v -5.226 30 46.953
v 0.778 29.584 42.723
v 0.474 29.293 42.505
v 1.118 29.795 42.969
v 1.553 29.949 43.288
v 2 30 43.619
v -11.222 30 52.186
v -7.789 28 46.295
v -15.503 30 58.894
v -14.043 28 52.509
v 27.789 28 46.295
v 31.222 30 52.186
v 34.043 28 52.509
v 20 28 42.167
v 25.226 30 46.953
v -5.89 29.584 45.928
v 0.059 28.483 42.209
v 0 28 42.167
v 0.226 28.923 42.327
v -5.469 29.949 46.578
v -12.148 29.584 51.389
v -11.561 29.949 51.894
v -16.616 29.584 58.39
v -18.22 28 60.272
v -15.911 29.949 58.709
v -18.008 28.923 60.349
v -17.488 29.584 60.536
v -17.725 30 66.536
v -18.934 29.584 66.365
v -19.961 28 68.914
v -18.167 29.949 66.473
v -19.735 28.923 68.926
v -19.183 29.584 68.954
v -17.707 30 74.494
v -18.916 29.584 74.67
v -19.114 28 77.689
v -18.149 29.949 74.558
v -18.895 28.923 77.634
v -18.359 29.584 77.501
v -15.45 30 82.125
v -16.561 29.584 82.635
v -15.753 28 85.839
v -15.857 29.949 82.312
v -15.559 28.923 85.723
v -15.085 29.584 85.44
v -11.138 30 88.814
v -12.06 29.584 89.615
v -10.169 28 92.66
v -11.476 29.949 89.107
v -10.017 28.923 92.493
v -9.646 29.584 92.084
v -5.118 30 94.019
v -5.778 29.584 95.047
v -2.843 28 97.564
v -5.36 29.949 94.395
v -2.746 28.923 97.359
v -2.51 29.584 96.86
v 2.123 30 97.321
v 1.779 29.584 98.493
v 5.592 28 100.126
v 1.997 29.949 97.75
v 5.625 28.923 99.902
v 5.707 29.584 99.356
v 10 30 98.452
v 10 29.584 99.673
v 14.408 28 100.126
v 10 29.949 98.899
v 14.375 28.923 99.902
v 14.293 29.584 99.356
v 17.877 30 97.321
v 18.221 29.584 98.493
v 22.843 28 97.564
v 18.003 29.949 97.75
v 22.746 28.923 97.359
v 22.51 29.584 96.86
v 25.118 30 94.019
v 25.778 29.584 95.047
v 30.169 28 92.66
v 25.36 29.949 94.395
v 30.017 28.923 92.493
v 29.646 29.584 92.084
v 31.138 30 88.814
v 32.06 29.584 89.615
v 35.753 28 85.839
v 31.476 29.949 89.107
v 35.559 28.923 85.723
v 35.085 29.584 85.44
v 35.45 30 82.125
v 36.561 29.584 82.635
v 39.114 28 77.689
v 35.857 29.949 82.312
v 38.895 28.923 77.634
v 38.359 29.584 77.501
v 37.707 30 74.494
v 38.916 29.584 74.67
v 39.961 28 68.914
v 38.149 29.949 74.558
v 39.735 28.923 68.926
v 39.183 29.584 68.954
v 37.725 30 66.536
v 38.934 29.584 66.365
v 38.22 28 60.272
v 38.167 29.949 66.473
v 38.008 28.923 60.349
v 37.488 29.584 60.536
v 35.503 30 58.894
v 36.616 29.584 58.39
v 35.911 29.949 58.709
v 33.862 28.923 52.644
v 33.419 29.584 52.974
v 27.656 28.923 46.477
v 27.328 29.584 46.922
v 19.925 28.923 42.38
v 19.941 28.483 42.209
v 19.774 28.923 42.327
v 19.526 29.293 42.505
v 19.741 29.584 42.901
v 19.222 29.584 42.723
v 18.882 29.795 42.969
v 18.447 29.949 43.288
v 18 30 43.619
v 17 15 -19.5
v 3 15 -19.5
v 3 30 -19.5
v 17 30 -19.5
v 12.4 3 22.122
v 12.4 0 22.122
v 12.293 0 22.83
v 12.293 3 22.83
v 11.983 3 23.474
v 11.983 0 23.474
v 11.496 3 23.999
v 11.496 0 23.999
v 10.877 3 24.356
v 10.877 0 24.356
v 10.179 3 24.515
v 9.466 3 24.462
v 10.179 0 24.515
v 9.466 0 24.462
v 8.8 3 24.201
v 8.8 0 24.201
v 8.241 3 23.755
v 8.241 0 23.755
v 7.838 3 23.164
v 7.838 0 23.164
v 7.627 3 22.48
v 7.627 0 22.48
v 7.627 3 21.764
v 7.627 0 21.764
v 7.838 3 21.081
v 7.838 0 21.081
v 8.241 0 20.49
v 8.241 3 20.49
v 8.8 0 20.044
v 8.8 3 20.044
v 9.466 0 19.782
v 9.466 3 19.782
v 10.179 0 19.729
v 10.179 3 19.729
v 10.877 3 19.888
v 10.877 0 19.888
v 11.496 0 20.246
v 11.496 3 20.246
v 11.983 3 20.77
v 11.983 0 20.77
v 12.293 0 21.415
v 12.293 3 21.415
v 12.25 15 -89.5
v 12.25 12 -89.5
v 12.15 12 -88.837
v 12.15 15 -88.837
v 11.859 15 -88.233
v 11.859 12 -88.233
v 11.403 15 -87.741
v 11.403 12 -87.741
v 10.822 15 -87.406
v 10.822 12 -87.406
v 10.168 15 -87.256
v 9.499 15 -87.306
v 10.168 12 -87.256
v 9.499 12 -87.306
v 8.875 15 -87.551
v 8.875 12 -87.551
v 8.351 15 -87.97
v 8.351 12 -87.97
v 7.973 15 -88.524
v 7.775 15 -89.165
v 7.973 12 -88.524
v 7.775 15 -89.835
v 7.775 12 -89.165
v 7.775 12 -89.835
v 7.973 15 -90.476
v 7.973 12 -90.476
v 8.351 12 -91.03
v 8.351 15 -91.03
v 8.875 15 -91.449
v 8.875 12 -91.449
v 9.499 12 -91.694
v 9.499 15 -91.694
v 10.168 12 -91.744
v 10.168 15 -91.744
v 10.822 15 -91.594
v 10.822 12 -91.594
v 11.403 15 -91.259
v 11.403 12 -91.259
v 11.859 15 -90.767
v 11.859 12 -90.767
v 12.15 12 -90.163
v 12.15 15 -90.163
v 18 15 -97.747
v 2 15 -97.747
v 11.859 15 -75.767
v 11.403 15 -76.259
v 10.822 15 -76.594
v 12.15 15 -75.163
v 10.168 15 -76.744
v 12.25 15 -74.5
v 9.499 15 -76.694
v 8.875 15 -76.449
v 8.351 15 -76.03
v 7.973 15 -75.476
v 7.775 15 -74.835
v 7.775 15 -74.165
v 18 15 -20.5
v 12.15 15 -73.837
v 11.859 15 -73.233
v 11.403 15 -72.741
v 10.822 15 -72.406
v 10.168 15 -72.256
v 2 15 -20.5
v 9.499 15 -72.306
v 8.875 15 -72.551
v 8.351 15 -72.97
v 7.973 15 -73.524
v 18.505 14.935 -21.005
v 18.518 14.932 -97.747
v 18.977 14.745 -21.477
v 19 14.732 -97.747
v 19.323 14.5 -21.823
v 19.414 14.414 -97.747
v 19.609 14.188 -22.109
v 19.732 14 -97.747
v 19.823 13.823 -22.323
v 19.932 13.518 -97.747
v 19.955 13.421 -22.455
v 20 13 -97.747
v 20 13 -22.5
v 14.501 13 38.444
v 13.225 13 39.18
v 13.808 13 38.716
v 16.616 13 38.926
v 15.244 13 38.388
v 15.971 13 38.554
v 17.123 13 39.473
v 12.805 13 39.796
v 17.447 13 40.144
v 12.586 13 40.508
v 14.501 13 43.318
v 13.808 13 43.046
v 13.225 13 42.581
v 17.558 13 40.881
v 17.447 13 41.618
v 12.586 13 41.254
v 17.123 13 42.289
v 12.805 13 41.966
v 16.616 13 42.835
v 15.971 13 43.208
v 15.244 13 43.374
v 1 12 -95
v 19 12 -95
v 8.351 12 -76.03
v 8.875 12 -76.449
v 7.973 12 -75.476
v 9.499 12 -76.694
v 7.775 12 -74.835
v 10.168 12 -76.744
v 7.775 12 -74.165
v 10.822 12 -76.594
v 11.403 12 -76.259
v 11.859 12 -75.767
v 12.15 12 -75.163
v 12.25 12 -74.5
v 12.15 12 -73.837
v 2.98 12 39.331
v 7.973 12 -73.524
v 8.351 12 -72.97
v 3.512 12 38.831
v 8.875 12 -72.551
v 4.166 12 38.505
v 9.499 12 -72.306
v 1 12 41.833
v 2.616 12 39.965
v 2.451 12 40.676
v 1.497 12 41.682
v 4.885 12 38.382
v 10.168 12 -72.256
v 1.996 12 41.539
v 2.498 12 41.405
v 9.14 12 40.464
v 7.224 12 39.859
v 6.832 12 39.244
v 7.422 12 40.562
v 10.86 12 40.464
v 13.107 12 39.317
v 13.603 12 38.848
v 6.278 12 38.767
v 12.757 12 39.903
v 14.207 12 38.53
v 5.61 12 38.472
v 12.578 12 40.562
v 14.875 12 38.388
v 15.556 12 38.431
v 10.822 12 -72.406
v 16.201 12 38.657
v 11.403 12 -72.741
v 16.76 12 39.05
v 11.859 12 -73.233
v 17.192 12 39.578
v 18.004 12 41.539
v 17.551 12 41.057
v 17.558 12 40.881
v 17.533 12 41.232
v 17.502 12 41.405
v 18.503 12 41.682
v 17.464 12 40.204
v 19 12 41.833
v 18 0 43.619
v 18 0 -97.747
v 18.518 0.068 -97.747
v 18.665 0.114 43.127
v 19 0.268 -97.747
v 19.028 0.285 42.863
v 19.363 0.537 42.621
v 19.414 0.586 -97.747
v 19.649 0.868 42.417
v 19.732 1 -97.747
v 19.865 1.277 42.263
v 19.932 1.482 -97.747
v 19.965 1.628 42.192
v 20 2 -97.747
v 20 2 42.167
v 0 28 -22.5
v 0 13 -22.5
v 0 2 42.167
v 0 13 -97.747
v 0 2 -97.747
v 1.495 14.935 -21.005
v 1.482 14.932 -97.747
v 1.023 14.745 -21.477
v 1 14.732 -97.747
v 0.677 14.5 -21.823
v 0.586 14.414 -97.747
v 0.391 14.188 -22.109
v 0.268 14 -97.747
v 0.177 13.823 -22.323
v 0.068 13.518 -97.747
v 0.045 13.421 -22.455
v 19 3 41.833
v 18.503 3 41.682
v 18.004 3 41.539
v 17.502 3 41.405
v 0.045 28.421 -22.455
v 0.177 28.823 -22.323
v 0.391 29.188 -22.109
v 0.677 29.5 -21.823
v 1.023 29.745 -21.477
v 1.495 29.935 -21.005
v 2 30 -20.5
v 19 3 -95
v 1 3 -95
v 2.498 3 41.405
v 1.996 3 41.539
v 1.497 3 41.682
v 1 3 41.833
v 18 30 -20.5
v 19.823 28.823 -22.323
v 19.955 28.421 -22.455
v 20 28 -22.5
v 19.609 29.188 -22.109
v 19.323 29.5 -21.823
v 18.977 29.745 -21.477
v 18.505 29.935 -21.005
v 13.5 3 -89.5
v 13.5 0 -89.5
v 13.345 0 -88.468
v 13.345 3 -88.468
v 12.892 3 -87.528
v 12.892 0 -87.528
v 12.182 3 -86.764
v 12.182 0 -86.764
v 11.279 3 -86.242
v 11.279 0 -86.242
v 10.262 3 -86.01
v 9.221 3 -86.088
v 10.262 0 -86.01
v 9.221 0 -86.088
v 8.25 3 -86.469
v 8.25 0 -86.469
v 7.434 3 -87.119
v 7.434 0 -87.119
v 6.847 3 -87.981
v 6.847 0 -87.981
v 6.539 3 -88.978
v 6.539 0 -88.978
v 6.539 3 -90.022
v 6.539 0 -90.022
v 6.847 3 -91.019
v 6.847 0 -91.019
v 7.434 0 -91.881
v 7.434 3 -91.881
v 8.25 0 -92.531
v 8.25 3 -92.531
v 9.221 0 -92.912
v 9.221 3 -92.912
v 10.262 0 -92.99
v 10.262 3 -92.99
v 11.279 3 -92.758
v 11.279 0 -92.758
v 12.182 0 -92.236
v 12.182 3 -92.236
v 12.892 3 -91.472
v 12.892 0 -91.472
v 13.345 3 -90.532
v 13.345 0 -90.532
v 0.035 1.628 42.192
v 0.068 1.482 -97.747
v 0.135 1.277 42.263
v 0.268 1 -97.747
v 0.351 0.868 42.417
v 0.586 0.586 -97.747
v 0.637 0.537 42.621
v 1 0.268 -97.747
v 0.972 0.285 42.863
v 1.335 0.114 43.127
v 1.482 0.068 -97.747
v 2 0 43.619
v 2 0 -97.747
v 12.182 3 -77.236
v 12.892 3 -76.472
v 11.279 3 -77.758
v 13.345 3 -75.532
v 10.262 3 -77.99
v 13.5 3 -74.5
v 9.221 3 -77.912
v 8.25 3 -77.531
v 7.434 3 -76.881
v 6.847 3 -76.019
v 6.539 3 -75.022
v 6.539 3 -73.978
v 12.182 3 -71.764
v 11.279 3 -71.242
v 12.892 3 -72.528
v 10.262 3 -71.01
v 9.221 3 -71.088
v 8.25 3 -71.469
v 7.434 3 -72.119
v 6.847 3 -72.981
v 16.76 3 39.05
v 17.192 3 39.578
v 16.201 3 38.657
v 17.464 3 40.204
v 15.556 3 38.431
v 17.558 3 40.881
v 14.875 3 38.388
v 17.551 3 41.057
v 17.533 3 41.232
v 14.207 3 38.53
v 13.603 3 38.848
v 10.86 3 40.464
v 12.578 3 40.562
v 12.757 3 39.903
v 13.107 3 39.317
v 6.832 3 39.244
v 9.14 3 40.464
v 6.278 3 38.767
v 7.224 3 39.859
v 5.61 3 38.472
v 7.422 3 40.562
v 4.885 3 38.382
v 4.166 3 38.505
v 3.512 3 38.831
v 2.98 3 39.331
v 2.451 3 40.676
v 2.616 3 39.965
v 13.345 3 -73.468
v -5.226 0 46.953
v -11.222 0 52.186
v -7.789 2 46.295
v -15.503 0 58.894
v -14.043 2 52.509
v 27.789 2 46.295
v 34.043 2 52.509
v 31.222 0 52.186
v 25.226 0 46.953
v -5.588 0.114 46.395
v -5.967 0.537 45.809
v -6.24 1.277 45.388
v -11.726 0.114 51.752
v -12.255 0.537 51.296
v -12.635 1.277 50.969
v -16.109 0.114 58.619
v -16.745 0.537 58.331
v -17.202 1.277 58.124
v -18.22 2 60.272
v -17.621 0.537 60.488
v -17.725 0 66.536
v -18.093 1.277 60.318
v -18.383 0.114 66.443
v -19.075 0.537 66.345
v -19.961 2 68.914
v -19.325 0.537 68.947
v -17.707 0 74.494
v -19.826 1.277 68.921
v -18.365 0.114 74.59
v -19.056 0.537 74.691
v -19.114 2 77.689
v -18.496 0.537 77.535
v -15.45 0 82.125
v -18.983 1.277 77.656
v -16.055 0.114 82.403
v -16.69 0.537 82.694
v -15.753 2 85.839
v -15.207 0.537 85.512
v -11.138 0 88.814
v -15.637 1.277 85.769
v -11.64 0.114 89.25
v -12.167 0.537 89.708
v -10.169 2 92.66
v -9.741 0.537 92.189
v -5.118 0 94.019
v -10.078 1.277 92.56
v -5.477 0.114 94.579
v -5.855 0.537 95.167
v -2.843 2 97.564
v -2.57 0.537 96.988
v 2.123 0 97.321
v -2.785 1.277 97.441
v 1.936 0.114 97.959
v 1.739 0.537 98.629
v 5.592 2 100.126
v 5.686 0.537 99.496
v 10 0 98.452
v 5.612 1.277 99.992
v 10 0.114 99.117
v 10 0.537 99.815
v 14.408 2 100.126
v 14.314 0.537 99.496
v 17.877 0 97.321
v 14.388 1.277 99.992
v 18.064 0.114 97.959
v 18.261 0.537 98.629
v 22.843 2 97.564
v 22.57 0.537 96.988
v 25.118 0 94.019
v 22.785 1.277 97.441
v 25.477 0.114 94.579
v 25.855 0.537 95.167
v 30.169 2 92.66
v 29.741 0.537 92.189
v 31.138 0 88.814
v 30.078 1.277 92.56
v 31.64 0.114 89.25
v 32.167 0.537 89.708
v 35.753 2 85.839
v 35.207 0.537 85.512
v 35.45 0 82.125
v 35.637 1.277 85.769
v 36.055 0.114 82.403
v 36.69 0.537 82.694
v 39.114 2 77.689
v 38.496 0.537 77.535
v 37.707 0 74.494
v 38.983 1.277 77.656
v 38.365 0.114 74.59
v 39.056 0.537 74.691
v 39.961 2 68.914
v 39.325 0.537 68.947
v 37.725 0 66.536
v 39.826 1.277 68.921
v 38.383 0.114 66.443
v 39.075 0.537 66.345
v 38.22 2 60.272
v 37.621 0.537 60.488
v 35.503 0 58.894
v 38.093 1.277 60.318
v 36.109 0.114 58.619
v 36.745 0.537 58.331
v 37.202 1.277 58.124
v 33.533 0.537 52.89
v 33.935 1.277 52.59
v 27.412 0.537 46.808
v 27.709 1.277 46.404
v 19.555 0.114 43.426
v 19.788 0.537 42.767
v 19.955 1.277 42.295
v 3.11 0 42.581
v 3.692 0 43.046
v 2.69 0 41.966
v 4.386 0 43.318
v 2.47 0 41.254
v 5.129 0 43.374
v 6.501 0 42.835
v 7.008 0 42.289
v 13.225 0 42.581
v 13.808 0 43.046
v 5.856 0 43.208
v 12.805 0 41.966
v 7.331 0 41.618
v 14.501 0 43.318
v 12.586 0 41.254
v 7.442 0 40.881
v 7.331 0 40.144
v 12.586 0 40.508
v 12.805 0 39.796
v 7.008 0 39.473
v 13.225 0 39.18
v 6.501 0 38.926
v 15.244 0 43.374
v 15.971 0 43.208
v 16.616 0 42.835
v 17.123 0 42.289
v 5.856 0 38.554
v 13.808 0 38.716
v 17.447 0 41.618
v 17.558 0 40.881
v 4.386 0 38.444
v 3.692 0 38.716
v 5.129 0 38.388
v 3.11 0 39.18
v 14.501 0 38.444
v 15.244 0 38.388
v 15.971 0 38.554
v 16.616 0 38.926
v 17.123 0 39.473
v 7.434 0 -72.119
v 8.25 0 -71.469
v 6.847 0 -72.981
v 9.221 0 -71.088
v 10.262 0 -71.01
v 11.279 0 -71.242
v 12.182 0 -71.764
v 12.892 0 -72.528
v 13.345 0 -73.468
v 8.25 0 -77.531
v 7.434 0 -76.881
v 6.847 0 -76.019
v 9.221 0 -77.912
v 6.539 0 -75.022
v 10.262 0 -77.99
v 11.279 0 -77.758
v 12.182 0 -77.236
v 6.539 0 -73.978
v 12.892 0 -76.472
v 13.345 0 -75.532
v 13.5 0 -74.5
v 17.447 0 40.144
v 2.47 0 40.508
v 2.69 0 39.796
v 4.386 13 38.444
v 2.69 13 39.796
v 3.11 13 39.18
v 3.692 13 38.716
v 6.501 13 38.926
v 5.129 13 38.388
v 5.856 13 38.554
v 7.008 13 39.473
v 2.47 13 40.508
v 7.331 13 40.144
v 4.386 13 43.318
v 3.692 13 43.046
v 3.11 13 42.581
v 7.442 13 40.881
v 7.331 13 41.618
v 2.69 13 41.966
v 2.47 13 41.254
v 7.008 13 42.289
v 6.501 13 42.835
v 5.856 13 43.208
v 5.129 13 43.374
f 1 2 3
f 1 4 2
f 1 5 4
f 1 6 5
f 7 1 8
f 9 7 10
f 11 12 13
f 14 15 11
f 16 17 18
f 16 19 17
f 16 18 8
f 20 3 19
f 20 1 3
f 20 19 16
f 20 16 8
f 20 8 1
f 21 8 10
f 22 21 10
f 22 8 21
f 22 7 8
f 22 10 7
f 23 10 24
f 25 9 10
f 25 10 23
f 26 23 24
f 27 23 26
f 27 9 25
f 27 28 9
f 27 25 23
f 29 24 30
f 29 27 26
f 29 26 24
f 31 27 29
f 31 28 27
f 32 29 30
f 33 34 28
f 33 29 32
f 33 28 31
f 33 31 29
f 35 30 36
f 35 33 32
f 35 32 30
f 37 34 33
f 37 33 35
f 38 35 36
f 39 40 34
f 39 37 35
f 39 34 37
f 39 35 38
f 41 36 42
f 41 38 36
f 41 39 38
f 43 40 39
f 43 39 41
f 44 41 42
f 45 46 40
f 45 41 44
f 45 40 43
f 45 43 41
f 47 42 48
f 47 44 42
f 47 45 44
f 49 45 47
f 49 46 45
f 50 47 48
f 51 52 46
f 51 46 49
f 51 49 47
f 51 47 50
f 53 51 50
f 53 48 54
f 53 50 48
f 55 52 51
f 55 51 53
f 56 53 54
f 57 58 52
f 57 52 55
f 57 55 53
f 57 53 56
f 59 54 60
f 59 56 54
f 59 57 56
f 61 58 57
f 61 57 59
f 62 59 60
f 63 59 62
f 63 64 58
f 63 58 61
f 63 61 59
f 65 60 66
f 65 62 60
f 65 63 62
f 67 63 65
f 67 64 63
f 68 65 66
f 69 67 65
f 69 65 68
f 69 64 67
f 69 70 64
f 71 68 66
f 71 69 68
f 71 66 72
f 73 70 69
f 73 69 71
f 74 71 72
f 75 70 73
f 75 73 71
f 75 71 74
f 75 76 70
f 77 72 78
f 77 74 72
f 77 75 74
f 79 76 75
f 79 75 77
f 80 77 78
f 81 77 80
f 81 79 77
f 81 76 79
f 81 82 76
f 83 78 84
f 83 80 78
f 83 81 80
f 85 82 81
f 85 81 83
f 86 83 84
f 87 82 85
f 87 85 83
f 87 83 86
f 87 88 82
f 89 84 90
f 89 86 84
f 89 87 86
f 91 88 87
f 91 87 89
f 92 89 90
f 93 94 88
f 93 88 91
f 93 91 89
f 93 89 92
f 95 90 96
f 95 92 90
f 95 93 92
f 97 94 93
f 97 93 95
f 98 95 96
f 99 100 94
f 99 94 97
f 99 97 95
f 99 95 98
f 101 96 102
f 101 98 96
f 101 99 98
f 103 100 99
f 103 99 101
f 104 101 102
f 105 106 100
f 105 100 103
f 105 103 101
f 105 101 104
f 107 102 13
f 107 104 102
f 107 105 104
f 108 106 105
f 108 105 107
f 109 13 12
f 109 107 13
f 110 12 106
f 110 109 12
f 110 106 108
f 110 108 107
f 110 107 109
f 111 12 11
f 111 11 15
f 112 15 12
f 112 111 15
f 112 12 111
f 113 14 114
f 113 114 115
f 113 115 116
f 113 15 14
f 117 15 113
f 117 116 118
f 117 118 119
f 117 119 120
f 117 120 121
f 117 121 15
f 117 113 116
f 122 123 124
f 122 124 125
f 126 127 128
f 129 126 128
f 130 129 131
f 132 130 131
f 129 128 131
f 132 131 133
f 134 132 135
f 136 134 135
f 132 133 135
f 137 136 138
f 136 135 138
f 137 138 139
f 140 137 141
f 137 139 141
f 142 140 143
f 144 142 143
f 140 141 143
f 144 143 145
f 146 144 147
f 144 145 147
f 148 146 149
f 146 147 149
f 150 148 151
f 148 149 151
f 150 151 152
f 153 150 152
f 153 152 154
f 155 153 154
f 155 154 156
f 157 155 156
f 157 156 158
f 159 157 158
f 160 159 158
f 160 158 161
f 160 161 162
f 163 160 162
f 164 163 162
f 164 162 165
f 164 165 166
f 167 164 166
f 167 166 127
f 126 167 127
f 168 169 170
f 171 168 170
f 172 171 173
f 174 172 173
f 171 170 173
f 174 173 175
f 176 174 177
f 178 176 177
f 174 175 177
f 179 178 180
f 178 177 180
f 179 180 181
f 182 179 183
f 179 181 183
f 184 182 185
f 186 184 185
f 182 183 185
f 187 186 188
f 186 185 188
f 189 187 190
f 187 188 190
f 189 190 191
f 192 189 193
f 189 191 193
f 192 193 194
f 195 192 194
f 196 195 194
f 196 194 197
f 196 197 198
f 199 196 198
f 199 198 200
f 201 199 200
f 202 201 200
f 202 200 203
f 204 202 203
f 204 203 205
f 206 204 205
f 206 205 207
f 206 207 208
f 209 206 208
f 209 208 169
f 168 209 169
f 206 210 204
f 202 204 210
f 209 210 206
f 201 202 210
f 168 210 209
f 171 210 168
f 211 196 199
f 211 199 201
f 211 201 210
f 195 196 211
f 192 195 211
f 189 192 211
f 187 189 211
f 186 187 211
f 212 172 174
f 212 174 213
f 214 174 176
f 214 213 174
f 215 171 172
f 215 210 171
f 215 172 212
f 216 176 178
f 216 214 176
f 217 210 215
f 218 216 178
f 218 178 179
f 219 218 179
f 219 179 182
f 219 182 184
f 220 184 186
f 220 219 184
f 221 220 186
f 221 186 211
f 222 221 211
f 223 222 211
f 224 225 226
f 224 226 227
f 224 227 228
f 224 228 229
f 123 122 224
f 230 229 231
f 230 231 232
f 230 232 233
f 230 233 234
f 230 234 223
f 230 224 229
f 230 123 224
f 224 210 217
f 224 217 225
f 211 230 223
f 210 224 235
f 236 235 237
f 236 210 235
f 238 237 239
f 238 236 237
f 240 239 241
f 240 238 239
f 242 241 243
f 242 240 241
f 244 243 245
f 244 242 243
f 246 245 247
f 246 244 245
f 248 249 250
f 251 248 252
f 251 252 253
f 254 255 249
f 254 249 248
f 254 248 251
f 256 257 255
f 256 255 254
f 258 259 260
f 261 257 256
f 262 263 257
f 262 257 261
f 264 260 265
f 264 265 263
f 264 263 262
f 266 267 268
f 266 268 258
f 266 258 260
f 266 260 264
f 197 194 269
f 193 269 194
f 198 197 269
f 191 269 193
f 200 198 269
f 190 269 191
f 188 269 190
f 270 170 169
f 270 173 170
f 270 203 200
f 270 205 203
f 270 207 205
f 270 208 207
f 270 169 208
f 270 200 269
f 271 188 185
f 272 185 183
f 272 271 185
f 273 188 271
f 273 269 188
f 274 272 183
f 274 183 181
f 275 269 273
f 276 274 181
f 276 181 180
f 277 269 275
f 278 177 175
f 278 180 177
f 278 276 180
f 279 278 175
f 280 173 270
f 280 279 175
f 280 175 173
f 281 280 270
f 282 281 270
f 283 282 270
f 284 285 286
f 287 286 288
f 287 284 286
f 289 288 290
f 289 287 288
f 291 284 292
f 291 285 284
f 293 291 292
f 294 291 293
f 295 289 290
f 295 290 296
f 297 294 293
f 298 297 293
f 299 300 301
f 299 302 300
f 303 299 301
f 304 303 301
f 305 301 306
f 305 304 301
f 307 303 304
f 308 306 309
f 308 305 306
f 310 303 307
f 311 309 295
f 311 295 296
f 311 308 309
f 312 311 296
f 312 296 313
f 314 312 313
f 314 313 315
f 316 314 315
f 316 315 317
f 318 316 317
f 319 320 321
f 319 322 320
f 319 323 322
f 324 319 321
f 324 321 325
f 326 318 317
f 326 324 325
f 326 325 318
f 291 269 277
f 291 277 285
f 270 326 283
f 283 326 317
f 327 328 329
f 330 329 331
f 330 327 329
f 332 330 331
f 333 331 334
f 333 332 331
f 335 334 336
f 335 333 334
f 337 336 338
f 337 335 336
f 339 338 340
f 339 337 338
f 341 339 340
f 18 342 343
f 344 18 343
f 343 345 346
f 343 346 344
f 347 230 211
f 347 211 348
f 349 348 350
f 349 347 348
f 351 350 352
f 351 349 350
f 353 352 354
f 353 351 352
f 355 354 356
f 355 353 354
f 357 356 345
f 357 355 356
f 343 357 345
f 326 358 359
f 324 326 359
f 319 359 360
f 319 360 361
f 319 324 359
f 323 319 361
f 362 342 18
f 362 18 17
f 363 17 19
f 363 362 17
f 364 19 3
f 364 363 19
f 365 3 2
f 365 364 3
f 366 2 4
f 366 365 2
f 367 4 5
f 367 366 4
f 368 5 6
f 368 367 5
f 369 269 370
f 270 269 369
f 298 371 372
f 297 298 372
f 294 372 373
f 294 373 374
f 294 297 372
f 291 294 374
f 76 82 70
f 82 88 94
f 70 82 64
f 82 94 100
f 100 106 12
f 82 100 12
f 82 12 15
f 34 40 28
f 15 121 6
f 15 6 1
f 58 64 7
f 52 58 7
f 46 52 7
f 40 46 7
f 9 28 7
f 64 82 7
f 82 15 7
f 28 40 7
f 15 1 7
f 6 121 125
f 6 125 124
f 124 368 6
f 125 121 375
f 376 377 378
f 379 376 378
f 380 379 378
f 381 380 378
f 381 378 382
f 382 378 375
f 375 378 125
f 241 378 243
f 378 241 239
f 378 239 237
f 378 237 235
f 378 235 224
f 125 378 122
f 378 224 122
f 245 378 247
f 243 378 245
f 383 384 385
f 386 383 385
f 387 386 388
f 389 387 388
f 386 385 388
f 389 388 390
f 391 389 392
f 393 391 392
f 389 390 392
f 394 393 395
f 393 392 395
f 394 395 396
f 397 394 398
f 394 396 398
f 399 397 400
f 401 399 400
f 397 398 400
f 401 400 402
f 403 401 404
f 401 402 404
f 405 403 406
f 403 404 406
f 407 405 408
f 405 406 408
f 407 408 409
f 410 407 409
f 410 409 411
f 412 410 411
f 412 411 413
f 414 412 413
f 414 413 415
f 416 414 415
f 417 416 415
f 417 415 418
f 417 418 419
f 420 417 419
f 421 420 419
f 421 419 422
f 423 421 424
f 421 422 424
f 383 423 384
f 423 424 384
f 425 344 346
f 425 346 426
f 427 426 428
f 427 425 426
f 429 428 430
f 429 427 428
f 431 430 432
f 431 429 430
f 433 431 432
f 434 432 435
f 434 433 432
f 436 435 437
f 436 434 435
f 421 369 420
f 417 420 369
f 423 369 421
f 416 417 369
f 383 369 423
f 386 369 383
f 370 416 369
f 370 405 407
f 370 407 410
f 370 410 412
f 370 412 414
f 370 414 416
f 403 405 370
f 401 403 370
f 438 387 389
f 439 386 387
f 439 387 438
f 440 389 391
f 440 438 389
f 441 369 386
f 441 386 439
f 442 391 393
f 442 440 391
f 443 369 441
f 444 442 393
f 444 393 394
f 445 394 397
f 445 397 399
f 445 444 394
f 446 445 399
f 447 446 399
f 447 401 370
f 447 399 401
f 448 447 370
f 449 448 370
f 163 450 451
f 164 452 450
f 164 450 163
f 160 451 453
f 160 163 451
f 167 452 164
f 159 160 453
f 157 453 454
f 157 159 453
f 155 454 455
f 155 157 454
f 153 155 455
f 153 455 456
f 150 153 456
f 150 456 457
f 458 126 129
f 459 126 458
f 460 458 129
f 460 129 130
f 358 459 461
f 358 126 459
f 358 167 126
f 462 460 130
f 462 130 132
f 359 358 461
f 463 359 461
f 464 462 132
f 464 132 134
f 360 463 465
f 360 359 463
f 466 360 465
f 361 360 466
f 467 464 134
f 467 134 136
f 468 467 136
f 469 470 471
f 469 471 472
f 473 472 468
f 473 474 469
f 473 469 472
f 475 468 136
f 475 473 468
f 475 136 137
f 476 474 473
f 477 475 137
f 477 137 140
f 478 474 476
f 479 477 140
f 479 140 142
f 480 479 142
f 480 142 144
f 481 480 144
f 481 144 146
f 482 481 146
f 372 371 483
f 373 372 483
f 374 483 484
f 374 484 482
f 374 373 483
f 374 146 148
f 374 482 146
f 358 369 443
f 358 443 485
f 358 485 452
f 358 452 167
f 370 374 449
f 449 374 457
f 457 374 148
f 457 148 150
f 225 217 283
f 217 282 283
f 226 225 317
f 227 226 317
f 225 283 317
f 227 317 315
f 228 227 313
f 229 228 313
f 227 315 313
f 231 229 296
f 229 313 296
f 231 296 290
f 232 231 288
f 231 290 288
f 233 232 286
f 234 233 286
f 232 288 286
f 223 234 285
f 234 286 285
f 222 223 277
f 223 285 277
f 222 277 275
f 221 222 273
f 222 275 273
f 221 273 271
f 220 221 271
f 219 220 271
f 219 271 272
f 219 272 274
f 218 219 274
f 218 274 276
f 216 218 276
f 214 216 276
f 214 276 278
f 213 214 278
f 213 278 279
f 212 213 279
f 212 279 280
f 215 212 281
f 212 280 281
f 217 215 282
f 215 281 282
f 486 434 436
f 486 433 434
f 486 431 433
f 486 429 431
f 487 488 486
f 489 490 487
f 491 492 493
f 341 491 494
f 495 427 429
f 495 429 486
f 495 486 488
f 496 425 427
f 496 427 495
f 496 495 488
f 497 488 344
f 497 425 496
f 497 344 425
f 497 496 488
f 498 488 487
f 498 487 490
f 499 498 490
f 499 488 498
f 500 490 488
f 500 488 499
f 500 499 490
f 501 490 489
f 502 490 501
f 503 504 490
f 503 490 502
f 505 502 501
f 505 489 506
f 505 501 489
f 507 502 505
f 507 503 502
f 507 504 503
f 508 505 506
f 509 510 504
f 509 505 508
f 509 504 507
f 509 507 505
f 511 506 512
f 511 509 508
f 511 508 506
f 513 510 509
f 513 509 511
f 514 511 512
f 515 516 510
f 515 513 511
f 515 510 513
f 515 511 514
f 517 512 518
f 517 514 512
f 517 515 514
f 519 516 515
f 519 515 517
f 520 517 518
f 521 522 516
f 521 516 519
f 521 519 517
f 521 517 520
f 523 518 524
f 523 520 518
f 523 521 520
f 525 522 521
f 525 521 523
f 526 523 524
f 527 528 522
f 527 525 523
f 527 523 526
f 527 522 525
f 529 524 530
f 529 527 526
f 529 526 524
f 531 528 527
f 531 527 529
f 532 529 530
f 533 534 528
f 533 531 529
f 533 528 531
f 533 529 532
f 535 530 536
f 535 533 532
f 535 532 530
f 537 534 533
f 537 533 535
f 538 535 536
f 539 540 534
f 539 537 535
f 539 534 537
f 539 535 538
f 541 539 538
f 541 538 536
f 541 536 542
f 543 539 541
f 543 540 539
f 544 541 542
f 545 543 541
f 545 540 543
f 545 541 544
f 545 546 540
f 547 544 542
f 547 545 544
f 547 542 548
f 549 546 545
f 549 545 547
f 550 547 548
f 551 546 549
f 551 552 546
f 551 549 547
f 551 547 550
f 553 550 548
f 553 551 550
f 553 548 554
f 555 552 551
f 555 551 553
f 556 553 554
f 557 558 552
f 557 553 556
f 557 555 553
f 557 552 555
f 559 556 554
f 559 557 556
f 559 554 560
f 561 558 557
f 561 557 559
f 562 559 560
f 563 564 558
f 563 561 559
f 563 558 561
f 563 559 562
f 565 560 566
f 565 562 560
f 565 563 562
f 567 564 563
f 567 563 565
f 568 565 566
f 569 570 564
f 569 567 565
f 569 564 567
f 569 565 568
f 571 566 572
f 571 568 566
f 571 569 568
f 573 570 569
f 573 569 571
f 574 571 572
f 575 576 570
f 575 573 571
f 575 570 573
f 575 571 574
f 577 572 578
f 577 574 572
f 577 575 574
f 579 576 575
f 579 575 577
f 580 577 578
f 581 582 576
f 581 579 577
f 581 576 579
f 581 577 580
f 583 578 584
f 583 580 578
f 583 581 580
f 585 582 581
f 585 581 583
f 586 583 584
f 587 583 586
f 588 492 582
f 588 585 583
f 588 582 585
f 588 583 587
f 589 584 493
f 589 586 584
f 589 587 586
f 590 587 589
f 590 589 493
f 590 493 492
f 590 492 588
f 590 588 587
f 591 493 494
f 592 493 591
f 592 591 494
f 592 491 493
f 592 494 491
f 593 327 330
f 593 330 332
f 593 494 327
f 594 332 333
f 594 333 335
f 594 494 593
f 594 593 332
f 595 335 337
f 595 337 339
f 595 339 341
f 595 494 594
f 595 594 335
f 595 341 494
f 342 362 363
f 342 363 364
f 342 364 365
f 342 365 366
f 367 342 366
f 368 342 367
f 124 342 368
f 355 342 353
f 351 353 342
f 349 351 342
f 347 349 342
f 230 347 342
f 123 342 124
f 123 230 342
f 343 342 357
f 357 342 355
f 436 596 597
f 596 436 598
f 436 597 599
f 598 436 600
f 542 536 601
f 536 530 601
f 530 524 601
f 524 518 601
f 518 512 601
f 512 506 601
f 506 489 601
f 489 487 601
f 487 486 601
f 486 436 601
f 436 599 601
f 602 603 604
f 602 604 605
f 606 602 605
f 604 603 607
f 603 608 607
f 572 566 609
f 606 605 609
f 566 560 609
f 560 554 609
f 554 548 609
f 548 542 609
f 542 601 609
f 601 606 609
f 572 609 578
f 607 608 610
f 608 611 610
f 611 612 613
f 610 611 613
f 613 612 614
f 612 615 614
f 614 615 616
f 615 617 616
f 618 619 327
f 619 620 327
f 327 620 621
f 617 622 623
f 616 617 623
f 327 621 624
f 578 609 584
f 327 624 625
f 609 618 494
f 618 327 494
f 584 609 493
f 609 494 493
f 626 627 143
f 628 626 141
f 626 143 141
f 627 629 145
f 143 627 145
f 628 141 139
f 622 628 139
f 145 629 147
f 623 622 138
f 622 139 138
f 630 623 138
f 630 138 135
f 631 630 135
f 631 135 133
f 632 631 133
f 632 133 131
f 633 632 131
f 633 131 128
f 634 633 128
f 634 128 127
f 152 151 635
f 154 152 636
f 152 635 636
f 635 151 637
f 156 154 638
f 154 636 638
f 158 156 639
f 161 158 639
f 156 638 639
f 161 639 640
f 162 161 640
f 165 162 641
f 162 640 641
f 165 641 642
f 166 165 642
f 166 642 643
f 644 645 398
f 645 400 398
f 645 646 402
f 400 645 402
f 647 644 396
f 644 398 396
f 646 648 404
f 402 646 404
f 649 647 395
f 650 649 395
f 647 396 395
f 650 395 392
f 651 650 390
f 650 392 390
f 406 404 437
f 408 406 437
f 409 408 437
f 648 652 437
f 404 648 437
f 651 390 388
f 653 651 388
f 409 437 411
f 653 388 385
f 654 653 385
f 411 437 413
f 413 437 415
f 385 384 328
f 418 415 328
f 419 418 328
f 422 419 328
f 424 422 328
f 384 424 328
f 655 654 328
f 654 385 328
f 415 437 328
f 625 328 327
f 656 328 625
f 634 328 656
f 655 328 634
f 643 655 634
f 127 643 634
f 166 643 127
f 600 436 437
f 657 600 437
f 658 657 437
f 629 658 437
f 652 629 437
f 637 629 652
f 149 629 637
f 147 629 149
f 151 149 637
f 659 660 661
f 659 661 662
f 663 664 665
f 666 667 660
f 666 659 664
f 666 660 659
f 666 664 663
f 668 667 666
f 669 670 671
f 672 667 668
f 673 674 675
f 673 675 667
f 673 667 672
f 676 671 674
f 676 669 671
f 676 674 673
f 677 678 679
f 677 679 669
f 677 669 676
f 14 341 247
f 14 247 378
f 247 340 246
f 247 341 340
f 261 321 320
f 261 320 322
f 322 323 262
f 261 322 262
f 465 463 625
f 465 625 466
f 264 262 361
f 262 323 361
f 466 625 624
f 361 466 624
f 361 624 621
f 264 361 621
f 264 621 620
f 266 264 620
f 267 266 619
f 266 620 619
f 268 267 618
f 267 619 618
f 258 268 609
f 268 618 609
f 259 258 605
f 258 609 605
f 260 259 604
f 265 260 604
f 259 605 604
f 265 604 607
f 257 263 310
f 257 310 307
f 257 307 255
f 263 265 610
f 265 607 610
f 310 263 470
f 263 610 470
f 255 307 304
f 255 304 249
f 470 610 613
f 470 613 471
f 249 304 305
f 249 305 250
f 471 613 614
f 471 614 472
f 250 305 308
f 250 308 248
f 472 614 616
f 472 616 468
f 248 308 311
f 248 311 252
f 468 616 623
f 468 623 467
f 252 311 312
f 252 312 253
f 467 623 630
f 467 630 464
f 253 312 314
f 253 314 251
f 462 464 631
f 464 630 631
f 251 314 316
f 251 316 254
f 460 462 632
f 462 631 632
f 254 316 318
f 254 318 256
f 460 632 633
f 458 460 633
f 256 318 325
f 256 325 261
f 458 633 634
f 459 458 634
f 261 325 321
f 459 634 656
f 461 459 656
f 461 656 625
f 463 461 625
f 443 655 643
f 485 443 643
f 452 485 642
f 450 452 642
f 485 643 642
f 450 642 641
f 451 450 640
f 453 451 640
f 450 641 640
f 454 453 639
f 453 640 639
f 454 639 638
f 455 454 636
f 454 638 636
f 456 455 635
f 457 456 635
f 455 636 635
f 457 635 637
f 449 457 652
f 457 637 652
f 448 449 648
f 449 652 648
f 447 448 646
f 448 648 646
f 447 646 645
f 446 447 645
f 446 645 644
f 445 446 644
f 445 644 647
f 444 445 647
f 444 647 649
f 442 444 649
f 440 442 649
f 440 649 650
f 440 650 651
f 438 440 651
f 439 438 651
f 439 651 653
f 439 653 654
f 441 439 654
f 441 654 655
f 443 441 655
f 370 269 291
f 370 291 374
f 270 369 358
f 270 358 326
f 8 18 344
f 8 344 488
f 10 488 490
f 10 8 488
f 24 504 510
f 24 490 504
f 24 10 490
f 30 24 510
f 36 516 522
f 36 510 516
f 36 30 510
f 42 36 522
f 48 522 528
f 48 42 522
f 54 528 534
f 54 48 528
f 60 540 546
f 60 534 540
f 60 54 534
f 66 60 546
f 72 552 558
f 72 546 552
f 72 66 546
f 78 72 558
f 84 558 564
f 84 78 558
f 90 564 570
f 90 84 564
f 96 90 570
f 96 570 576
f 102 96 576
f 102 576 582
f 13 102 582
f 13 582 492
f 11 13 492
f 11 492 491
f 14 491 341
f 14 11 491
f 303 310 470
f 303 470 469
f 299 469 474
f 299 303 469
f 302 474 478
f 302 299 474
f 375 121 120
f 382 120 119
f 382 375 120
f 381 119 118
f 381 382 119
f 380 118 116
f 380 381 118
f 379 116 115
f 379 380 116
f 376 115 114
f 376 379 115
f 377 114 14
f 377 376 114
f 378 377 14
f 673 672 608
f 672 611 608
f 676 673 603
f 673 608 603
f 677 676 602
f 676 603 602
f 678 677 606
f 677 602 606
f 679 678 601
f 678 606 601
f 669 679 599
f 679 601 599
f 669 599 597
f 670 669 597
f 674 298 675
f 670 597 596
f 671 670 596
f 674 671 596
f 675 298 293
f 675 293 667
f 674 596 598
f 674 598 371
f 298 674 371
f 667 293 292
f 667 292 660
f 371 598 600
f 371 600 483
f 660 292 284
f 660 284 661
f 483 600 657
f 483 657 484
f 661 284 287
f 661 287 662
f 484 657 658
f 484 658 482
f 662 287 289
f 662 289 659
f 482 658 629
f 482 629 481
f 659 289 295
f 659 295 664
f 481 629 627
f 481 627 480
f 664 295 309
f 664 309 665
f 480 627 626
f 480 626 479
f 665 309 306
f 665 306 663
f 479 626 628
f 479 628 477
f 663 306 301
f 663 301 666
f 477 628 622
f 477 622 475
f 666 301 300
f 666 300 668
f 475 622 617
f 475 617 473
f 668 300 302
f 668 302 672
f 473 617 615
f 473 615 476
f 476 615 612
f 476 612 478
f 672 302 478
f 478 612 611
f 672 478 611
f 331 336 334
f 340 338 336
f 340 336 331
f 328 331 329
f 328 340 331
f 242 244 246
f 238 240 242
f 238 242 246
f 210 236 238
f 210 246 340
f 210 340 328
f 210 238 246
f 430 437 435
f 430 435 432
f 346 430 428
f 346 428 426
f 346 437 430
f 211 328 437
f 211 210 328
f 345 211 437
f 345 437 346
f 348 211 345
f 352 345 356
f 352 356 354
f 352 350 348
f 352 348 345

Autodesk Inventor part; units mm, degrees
ref_plane "YZ Plane" through (0, 0, 0) normal (1, 0, 0) x (0, 1, 0)
ref_plane "XZ Plane" through (0, 0, 0) normal (0, 1, 0) x (-1, 0, 0)
ref_plane "XY Plane" through (0, 0, 0) normal (0, 0, 1) x (1, 0, 0)
sketch "Sketch1" plane through (0, 0, 0) normal (0, 1, 0) x (-1, 0, 0)
  line L0 (0, 0) -> (-20, 0)
  line L1 (-20, 0) -> (-20, -100)
  line L2 (-20, -100) -> (0, -100)
  line L3 (0, -100) -> (0, 0)
  dimension "d0" = 20
  dimension "d1" = 100
extrude "Extrusion1" add sketch "Sketch1" along normal blind 15
sketch "Sketch2" plane through (0, 15, 0) normal (0, 1, 0) x (1, 0, 0)
  line L0 (20, 0) -> (20, 100) projected
  line L1 (0, 100) -> (0, 0) projected
  line L2 (20, 0) -> (0, 0)
  line L3 (0, 0) -> (0, 19.5)
  line L4 (0, 19.5) -> (20, 19.5)
  line L5 (20, 19.5) -> (20, 0)
  dimension "d4" = 19.5
extrude "Extrusion2" add sketch "Sketch2" along normal blind 15
sketch "Sketch3" plane through (0, 15, 0) normal (0, 1, 0) x (1, 0, 0)
  line L0 (20, 19.5) -> (0, 19.5) projected
  line L1 (0, 19.5) -> (0, 22.5)
  line L2 (0, 100) -> (0, 0) projected
  line L3 (0, 22.5) -> (3.0005, 19.5)
  line L4 (3.0005, 19.5) -> (0, 19.5)
  line L5 (20, 19.5) -> (20, 22.5)
  line L6 (20, 0) -> (20, 100) projected
  line L7 (20, 22.5) -> (16.9995, 19.5)
  line L8 (16.9995, 19.5) -> (20, 19.5)
  dimension "d7" = 3
  dimension "d8" = 4.243
  dimension "d9" = 3
  dimension "d10" = 4.243
extrude "Extrusion3" add sketch "Sketch3" along normal blind 15
sketch "Sketch4" plane through (0, 0, 0) normal (0, 0, 1) x (1, 0, 0)
  point P0 (0, 0)
sketch "Sketch5" plane through (0, 0, 0) normal (0, 0, 1) x (1, 0, 0)
  line L0 (0, 0) -> (20, 0) projected
  line L1 (20, 30) -> (16.9995, 30) projected
  line L2 (0, 0) -> (20, 0)
  line L3 (20, 0) -> (20, 30)
  line L4 (20, 30) -> (0, 30)
  line L5 (0, 30) -> (0, 0)
extrude "Extrusion4" add sketch "Sketch5" along normal blind 80
sketch "Sketch6" plane through (0, 0, 80) normal (0, 0, 1) x (1, 0, 0)
  line L0 (19, 3) -> (1, 3)
  line L1 (1, 3) -> (1, 12)
  line L2 (1, 12) -> (19, 12)
  line L3 (19, 12) -> (19, 3)
  line L4 (0, 30) -> (0, 0) projected
  line L5 (0, 0) -> (20, 0) projected
  dimension "d15" = 18
  dimension "d16" = 9
  dimension "d17" = 1
  dimension "d18" = 3
extrude "Extrusion5" cut sketch "Sketch6" against normal blind 160
sketch "Sketch7" plane through (0, 0, 0) normal (0, -1, 0) x (1, 0, 0)
  circle A0 centre (10, -89.5) radius 2.25
  circle A1 centre (10, -74.5) radius 2.25
  line L0 (20, -100) -> (0, -100) projected
  line L1 (0, -100) -> (0, 80) projected
  point P0 (0, 0)
  point P1 (10, -100)
  dimension "d21" = 4.5
  dimension "d22" = 4.5
  dimension "d23" = 10.5
  dimension "d24" = 10.5
  dimension "d25" = 10
  dimension "d26" = 10
extrude "Extrusion6" cut sketch "Sketch7" against normal blind 160
sketch "Sketch8" plane through (0, 0, -80) normal (0, 0, 1) x (1, 0, 0)
  line L0 (19, 3) -> (1, 3) projected
  line L1 (1, 12) -> (19, 12) projected
  line L2 (19, 3) -> (1, 3)
  line L3 (1, 3) -> (1, 12)
  line L4 (1, 12) -> (19, 12)
  line L5 (19, 12) -> (19, 3)
  point P0 (0, 0)
extrude "Extrusion7" add sketch "Sketch8" along normal blind 170
sketch "Sketch9" plane through (0, 30, 0) normal (0, 1, 0) x (1, 0, 0)
  point P0 (0, 0)
sketch "Sketch10" plane through (0, 0, 90) normal (0, 0, 1) x (1, 0, 0)
  line L0 (19, 3) -> (1, 3) projected
  line L1 (1, 12) -> (19, 12) projected
  line L2 (1, 3) -> (19, 3)
  line L3 (19, 3) -> (19, 12)
  line L4 (19, 12) -> (1, 12)
  line L5 (1, 12) -> (1, 3)
  point P0 (0, 0)
extrude "Extrusion8" cut sketch "Sketch10" against normal blind 185
sketch "Sketch11" plane through (0, 15, 0) normal (0, 1, 0) x (1, 0, 0)
  line L0 (0, 100) -> (0, -80) projected
  line L1 (20, -80) -> (20, 100) projected
  line L2 (0, 100) -> (20, 100)
  line L3 (20, 100) -> (20, 97.7472)
  line L4 (20, 97.7472) -> (0, 97.7472)
  line L5 (0, 97.7472) -> (0, 100)
  point P0 (0, 0)
  point P1 (0, 97.7472)
extrude "Extrusion9" cut sketch "Sketch11" against normal blind 185
sketch "Sketch12" plane through (0, 30, 0) normal (0, 1, 0) x (1, 0, 0)
  circle A0 centre (10, -70.4515) radius 30
  point P0 (0, 0)
  dimension "d35" = 60
extrude "Extrusion10" add sketch "Sketch12" along normal mid plane 60
sketch "Sketch13" plane through (10, 60, 70.4515) normal (0, 1, 0) x (1, 0, 0)
  circle A0 centre (0, 0) radius 30
  point P0 (-10, 70.4515)
extrude "Extrusion11" cut sketch "Sketch13" against normal blind 30
sketch "Sketch14" plane through (0, 30, 0) normal (0, 1, 0) x (1, 0, 0)
  point P0 (0, 0)
sketch "Sketch15" plane through (0, 0, 0) normal (0, -1, 0) x (1, 0, 0)
  arc A0 (1, 41.8333) -> (19, 41.8333) centre (10, 70.4515) ccw projected
  circle A1 centre (4.9424, 40.8809) radius 2.5
  circle A2 centre (15.0576, 40.8809) radius 2.5
  point P0 (0, 0)
  dimension "d40" = 5
  dimension "d41" = 5
extrude "Extrusion12" cut sketch "Sketch15" against normal blind 13
sketch "Sketch16" plane through (0, 0, 0) normal (0, -1, 0) x (1, 0, 0)
  circle A0 centre (10, -89.5) radius 2.25 projected
  circle A1 centre (10, -89.5) radius 3.5
  circle A2 centre (10, -74.5) radius 2.25 projected
  circle A3 centre (10, -74.5) radius 3.5
  point P0 (0, 0)
  dimension "d44" = 7
  dimension "d45" = 7
extrude "Extrusion13" cut sketch "Sketch16" against normal blind 6
fillet "Fillet1" radius 2 8 edges at (20, 30, 9.8336) (20, 15, -60.1236) (0, 15, -60.1236) (0, 30, 9.8336) (0, 0, -27.79) (20, 0, -27.79) (10, 30, 100.4515) (10, 0, 100.4515)
sketch "Sketch17" plane through (0, 0, 0) normal (0, -1, 0) x (1, 0, 0)
  circle A0 centre (10, 22.1222) radius 2.4
  line L0 (2, -97.7472) -> (2, 43.6187) projected
  point P0 (0, 0)
  dimension "d49" = 4.8
  dimension "d50" = 8
extrude "Extrusion14" cut sketch "Sketch17" against normal blind 6
properties part number "shotHolder"
